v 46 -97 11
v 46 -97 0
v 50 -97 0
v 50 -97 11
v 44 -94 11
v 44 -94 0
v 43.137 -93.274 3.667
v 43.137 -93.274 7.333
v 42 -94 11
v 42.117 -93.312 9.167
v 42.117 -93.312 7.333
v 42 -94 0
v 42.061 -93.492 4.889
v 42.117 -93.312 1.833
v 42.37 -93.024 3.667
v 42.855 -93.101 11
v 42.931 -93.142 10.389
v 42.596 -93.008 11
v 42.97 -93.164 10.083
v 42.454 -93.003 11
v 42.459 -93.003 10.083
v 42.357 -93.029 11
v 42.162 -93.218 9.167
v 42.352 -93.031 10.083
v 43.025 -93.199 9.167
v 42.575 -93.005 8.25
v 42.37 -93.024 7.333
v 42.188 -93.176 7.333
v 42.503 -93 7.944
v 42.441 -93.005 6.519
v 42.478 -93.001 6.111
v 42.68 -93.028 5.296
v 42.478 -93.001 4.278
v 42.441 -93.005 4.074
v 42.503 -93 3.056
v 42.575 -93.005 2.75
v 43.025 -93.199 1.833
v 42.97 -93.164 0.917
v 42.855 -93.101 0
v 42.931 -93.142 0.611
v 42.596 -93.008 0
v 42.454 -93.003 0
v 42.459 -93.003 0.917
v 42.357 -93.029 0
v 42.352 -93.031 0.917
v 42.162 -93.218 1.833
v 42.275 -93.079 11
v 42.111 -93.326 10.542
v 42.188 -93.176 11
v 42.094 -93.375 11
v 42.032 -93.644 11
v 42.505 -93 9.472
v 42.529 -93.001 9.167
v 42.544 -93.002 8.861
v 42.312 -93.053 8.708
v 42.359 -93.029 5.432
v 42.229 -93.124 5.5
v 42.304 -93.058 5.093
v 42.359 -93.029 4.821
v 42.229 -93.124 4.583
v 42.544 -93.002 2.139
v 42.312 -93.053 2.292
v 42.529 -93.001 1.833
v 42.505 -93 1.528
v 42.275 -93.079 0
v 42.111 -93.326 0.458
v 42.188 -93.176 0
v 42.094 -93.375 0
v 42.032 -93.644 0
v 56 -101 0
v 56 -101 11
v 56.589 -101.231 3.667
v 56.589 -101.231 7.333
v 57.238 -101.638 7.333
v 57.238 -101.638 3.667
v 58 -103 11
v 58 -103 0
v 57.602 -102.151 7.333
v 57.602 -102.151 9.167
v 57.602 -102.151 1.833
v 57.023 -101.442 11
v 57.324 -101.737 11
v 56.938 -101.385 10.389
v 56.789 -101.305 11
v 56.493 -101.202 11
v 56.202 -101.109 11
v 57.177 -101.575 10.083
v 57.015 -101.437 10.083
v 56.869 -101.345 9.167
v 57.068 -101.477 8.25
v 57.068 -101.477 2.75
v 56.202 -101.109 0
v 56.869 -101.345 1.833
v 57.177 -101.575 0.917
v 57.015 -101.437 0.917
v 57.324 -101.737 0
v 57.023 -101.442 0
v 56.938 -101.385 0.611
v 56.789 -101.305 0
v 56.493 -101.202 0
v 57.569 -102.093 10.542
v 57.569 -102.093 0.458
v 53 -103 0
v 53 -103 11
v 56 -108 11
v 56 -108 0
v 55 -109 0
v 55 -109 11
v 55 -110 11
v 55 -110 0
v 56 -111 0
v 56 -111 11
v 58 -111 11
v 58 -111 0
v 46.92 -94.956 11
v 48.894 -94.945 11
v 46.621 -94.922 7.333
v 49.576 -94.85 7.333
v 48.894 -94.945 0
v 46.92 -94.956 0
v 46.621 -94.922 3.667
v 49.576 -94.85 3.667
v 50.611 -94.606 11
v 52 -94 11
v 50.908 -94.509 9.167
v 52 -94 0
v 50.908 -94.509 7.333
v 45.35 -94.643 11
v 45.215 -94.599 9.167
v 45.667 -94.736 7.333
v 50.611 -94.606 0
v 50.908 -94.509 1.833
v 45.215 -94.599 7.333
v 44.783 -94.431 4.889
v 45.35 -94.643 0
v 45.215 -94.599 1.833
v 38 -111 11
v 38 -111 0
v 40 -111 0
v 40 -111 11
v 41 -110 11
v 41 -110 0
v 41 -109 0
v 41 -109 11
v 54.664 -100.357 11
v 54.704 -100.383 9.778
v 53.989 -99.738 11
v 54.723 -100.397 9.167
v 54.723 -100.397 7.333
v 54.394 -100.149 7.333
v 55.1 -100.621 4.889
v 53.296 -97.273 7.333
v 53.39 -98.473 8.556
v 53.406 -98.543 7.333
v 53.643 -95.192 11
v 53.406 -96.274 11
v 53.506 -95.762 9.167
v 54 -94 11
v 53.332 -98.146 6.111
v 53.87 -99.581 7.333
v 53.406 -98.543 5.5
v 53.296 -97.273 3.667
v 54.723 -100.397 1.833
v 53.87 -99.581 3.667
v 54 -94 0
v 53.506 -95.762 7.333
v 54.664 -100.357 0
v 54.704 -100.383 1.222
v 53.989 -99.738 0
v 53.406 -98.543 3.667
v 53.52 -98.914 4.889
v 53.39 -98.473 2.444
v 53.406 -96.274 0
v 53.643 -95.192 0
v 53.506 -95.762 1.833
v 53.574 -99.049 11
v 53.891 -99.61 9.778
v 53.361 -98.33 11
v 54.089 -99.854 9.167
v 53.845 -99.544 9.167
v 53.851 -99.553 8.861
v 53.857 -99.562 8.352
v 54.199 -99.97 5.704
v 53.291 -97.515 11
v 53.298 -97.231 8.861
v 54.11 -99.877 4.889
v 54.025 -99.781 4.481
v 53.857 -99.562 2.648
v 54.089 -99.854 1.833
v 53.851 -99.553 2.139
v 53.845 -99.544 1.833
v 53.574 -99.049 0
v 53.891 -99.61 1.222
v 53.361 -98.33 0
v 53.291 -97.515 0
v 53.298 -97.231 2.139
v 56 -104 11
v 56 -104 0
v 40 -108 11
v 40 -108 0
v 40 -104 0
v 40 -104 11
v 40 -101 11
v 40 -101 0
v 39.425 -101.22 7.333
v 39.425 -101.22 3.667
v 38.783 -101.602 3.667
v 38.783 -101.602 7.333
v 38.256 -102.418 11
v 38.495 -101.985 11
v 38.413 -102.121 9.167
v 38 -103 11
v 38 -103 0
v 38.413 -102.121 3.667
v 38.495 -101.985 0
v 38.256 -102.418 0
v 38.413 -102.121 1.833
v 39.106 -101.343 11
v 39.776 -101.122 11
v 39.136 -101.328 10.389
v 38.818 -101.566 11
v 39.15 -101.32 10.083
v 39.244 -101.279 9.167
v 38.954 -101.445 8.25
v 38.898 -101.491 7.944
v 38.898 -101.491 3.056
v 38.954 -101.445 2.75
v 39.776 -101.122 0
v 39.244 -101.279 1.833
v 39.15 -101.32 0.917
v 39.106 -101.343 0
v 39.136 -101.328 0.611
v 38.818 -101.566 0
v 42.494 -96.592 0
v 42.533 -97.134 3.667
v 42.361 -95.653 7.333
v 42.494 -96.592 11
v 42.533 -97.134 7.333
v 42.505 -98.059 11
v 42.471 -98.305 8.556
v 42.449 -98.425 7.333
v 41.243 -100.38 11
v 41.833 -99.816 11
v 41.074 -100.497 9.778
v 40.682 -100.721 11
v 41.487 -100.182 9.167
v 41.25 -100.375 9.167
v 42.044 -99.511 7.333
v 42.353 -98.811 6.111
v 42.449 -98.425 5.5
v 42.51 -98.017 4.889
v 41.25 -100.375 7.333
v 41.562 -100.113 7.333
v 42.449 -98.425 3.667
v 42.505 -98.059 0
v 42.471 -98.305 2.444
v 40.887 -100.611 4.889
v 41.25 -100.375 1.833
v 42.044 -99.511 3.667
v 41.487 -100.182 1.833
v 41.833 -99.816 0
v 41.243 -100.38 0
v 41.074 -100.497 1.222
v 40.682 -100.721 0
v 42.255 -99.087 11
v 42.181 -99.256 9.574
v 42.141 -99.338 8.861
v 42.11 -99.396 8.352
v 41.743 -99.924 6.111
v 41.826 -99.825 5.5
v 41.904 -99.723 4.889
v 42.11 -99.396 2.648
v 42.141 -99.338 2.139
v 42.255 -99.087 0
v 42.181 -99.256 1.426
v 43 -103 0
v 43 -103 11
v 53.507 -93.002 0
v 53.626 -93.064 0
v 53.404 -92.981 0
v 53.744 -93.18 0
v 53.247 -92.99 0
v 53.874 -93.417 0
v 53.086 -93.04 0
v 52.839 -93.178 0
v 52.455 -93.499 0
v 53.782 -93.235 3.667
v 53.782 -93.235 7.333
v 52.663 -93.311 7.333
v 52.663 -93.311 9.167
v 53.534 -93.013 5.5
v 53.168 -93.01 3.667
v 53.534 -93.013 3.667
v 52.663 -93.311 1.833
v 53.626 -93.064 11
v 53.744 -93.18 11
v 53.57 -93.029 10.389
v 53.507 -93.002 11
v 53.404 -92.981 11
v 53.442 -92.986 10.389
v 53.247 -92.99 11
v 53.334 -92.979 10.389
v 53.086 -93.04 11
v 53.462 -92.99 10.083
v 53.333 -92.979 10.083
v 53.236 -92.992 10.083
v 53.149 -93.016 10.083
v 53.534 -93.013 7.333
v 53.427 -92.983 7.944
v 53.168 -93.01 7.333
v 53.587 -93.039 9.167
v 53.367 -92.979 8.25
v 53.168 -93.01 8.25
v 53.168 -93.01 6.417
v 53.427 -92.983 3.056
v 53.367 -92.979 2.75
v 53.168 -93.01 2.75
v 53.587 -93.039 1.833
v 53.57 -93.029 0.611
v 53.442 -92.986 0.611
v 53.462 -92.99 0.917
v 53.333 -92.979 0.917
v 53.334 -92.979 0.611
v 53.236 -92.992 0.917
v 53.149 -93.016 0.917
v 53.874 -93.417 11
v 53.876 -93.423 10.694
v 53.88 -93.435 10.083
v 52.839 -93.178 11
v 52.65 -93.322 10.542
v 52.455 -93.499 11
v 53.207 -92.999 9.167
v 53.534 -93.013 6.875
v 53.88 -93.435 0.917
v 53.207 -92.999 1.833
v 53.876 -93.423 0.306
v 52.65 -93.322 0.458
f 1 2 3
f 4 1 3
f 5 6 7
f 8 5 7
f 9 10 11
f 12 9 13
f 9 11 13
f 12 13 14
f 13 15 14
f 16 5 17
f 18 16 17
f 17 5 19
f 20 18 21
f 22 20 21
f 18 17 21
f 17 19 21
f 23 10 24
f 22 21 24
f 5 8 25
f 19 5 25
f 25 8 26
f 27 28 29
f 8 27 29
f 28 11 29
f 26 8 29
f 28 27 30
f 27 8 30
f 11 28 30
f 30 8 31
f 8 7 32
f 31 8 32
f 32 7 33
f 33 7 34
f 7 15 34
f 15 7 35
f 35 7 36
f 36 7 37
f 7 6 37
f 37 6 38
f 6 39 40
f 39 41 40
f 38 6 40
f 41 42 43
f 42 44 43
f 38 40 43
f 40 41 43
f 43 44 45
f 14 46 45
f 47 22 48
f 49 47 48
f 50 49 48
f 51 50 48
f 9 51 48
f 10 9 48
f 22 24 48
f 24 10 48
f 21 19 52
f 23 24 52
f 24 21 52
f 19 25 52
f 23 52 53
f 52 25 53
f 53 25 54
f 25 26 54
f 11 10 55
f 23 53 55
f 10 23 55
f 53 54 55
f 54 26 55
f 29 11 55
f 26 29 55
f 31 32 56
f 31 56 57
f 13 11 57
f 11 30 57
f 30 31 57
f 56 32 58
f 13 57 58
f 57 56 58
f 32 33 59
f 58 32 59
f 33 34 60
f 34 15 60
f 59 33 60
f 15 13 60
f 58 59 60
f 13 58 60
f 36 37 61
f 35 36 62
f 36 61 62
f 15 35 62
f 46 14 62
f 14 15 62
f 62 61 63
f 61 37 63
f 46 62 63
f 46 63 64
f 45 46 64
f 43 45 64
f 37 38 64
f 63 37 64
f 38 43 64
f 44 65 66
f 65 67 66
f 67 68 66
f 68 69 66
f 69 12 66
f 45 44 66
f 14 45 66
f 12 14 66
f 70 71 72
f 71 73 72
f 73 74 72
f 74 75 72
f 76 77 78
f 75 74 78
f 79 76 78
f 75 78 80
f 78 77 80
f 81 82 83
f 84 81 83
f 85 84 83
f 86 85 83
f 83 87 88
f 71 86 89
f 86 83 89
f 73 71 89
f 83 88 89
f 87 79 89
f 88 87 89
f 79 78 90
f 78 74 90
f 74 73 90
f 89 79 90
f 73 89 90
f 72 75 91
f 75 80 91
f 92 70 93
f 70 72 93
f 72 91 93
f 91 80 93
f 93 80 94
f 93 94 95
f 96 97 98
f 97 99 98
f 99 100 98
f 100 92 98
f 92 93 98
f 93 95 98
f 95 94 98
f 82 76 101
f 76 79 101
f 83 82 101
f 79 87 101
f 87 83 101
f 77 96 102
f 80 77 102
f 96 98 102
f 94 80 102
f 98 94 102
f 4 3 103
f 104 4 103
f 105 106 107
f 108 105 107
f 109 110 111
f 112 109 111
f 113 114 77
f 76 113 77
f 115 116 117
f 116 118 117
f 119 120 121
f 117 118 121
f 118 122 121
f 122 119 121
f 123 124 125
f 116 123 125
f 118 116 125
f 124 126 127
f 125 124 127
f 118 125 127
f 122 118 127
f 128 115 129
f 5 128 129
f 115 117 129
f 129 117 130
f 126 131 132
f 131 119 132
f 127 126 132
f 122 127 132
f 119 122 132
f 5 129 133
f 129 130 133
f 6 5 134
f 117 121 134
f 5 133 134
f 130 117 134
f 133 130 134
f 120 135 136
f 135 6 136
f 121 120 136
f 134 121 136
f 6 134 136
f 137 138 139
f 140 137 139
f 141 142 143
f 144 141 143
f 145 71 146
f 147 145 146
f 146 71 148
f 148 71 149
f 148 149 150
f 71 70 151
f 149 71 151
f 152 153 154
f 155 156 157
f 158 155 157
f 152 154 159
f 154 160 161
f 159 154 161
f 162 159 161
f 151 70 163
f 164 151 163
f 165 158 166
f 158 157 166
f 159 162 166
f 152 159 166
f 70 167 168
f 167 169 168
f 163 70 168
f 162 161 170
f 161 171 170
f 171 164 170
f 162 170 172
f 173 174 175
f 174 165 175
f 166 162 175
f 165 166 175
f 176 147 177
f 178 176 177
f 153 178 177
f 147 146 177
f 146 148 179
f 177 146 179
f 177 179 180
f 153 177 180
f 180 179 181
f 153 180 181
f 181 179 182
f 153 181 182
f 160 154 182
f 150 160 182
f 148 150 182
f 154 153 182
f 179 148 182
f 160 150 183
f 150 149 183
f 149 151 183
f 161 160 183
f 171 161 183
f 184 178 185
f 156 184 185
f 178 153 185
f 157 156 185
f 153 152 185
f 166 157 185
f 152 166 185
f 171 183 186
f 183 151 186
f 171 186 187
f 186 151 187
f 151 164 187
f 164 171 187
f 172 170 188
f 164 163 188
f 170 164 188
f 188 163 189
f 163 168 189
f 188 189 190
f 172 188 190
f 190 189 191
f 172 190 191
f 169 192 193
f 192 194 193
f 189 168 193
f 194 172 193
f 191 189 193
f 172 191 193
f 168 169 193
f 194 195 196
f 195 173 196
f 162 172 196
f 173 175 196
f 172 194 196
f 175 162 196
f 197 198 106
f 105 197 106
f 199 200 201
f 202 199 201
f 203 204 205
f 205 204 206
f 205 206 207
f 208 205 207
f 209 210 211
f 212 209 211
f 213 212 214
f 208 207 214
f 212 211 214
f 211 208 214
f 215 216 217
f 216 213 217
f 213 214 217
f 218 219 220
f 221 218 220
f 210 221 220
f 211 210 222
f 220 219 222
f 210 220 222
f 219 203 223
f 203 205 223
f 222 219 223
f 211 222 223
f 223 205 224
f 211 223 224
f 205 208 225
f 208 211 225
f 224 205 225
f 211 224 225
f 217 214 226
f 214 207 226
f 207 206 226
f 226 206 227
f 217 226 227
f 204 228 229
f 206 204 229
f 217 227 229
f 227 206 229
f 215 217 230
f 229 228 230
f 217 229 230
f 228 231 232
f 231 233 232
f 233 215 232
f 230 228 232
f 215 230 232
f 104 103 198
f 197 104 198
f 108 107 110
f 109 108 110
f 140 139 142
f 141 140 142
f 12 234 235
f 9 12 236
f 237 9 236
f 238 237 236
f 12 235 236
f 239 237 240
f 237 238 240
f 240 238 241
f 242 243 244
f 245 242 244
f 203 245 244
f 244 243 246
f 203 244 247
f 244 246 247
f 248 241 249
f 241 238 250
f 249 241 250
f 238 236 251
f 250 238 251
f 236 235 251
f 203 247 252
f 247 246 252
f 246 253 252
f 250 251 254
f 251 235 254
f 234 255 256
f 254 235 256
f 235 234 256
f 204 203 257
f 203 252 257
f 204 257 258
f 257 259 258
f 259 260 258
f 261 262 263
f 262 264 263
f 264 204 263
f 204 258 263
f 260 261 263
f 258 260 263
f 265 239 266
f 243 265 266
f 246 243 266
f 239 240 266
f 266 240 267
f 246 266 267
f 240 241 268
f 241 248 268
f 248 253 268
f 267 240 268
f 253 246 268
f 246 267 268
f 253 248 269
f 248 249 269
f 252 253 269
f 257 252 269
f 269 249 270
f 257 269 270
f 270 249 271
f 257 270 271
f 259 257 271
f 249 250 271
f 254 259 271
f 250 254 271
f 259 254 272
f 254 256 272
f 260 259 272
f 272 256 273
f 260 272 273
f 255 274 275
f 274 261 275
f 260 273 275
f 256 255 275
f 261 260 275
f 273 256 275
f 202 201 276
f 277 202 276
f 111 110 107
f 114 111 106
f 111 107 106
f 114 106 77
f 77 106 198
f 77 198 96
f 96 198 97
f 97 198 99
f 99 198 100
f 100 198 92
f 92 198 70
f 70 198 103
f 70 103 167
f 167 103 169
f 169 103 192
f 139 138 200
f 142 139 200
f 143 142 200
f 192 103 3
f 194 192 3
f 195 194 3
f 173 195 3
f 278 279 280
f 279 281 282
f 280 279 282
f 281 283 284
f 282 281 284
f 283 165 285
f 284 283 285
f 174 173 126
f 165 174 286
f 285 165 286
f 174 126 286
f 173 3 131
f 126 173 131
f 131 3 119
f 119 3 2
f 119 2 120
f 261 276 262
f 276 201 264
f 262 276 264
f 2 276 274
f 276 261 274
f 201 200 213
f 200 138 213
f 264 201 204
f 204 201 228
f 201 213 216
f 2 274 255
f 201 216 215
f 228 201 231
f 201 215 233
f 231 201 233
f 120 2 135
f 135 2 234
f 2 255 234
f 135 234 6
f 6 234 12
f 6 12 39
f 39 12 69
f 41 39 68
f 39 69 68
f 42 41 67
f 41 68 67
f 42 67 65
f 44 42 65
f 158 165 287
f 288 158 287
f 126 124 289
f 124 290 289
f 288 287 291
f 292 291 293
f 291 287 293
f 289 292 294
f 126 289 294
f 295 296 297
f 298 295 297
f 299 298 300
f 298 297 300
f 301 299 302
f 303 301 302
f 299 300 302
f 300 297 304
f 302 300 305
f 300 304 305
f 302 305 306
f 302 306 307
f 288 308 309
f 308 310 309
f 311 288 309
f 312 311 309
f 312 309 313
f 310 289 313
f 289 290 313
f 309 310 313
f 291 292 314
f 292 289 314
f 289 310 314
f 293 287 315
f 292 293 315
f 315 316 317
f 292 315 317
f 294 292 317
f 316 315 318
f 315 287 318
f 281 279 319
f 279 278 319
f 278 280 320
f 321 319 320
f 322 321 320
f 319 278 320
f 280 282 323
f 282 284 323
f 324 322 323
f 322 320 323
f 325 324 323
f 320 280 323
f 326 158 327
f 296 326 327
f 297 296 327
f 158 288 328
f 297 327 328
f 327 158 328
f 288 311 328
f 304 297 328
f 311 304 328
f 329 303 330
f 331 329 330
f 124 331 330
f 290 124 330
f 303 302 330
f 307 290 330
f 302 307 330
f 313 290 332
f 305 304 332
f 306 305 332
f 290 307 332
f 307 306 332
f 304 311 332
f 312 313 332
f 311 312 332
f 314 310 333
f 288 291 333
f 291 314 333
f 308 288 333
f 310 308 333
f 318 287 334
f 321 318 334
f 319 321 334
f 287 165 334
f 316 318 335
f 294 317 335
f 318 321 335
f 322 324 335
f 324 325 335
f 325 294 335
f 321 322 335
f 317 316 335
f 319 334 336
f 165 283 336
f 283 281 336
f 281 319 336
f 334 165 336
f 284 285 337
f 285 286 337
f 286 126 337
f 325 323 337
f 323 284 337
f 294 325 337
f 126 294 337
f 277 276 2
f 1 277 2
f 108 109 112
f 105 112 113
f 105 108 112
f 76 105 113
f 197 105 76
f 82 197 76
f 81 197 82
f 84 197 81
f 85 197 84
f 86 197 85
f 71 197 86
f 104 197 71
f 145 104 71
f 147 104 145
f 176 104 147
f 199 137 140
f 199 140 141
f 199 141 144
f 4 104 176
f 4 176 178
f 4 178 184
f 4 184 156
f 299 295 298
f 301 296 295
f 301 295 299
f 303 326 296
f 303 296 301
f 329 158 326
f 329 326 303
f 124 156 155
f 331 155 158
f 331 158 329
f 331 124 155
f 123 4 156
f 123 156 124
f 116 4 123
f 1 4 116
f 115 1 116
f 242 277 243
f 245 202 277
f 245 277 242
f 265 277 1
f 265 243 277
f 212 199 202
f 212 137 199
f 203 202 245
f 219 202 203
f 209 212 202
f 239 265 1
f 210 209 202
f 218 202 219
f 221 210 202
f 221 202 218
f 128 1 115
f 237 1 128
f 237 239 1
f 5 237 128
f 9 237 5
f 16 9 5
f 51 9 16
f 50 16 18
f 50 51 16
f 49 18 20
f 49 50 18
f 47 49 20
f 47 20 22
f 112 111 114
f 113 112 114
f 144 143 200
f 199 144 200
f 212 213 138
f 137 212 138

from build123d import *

# Parameters (mm, degrees)
EXTRUDE_DEPTH = 11


with BuildPart() as part:
    # path2076 → Extrude (new body)
    with BuildSketch(Plane(origin=(48, -101.847886, 0), x_dir=(0, 1, 0), z_dir=(0, 0, 1))):
        with BuildLine():
            add(Edge.make_bspline(
                [(-6.152114, 8.000001), (-2.152114, 8)],
                knots=[0, 0, 4, 4], degree=1))
            add(Edge.make_bspline(
                [(-2.152114, 8), (-1.152114, 5)],
                knots=[0, 0, 3.162278, 3.162278], degree=1))
            add(Edge.make_bspline(
                [(-1.152114, 5), (4.847886, 2)],
                knots=[0, 0, 6.708204, 6.708204], degree=1))
            add(Edge.make_bspline(
                [(4.847886, 2), (4.847886, -2)],
                knots=[0, 0, 4, 4], degree=1))
            add(Edge.make_bspline(
                [(4.847886, -2), (-1.152114, -5)],
                knots=[0, 0, 6.708204, 6.708204], degree=1))
            add(Edge.make_bspline(
                [(-1.152114, -5), (-2.152114, -8)],
                knots=[0, 0, 3.162278, 3.162278], degree=1))
            add(Edge.make_bspline(
                [(-2.152114, -8), (-6.152114, -7.999998)],
                knots=[0, 0, 4, 4], degree=1))
            add(Edge.make_bspline(
                [(-6.152114, -7.999998), (-7.152114, -7)],
                knots=[0, 0, 1.414212, 1.414212], degree=1))
            add(Edge.make_bspline(
                [(-7.152114, -7), (-8.152114, -7)],
                knots=[0, 0, 1, 1], degree=1))
            add(Edge.make_bspline(
                [(-8.152114, -7), (-9.152114, -8)],
                knots=[0, 0, 1.414214, 1.414214], degree=1))
            add(Edge.make_bspline(
                [(-9.152114, -8), (-9.152114, -8.999999)],
                knots=[0, 0, 0.999999, 0.999999], degree=1))
            add(Edge.make_bspline(
                [(-9.152114, -8.999999), (-9.152114, -10)],
                knots=[0, 0, 1.000001, 1.000001], degree=1))
            add(Edge.make_bspline(
                [(-9.152114, -10), (-3.152114, -10)],
                knots=[0, 0, 6, 6], degree=1))
            add(Edge.make_bspline(
                [(-3.152114, -10), (-1.152114, -10)],
                knots=[0, 0, 2, 2], degree=1))
            add(Edge.make_bspline(
                [(-1.152114, -10), (0.946616, -9.165553), (0.446196, -8.575302), (0.847886, -8)],
                knots=[0, 0, 0, 0, 1, 1, 1, 1], degree=3))
            add(Edge.make_bspline(
                [(0.847886, -8), (1.847886, -5), (4.067289, -4.7497), (7.847886, -6)],
                knots=[0, 0, 0, 0, 1, 1, 1, 1], degree=3))
            add(Edge.make_bspline(
                [(7.847886, -6), (8.658754, -5.92727), (9.669901, -5.497988), (7.847886, -4)],
                knots=[0, 0, 0, 0, 1, 1, 1, 1], degree=3))
            add(Edge.make_bspline(
                [(7.847886, -4), (6.679718, -2.129684), (6.357649, 1.834561), (7.847886, 4)],
                knots=[0, 0, 0, 0, 1, 1, 1, 1], degree=3))
            add(Edge.make_bspline(
                [(7.847886, 4), (8.561538, 4.812056), (9.686967, 5.928072), (7.847886, 6)],
                knots=[0, 0, 0, 0, 1, 1, 1, 1], degree=3))
            add(Edge.make_bspline(
                [(7.847886, 6), (4.380341, 5.134889), (1.847886, 5), (0.847886, 8)],
                knots=[0, 0, 0, 0, 1, 1, 1, 1], degree=3))
            add(Edge.make_bspline(
                [(0.847886, 8), (0.424126, 8.564899), (1.038266, 9.123105), (-1.152114, 10)],
                knots=[0, 0, 0, 0, 1, 1, 1, 1], degree=3))
            add(Edge.make_bspline(
                [(-1.152114, 10), (-9.152114, 10)],
                knots=[0, 0, 8, 8], degree=1))
            add(Edge.make_bspline(
                [(-9.152114, 10), (-9.152114, 9.000002)],
                knots=[0, 0, 0.999998, 0.999998], degree=1))
            add(Edge.make_bspline(
                [(-9.152114, 9.000002), (-9.152114, 8)],
                knots=[0, 0, 1.000002, 1.000002], degree=1))
            add(Edge.make_bspline(
                [(-9.152114, 8), (-8.152114, 7)],
                knots=[0, 0, 1.414214, 1.414214], degree=1))
            add(Edge.make_bspline(
                [(-8.152114, 7), (-7.152114, 7)],
                knots=[0, 0, 1, 1], degree=1))
            add(Edge.make_bspline(
                [(-7.152114, 7), (-6.152114, 8.000001)],
                knots=[0, 0, 1.414214, 1.414214], degree=1))
        make_face()
    extrude(amount=EXTRUDE_DEPTH)


solid = part.part
